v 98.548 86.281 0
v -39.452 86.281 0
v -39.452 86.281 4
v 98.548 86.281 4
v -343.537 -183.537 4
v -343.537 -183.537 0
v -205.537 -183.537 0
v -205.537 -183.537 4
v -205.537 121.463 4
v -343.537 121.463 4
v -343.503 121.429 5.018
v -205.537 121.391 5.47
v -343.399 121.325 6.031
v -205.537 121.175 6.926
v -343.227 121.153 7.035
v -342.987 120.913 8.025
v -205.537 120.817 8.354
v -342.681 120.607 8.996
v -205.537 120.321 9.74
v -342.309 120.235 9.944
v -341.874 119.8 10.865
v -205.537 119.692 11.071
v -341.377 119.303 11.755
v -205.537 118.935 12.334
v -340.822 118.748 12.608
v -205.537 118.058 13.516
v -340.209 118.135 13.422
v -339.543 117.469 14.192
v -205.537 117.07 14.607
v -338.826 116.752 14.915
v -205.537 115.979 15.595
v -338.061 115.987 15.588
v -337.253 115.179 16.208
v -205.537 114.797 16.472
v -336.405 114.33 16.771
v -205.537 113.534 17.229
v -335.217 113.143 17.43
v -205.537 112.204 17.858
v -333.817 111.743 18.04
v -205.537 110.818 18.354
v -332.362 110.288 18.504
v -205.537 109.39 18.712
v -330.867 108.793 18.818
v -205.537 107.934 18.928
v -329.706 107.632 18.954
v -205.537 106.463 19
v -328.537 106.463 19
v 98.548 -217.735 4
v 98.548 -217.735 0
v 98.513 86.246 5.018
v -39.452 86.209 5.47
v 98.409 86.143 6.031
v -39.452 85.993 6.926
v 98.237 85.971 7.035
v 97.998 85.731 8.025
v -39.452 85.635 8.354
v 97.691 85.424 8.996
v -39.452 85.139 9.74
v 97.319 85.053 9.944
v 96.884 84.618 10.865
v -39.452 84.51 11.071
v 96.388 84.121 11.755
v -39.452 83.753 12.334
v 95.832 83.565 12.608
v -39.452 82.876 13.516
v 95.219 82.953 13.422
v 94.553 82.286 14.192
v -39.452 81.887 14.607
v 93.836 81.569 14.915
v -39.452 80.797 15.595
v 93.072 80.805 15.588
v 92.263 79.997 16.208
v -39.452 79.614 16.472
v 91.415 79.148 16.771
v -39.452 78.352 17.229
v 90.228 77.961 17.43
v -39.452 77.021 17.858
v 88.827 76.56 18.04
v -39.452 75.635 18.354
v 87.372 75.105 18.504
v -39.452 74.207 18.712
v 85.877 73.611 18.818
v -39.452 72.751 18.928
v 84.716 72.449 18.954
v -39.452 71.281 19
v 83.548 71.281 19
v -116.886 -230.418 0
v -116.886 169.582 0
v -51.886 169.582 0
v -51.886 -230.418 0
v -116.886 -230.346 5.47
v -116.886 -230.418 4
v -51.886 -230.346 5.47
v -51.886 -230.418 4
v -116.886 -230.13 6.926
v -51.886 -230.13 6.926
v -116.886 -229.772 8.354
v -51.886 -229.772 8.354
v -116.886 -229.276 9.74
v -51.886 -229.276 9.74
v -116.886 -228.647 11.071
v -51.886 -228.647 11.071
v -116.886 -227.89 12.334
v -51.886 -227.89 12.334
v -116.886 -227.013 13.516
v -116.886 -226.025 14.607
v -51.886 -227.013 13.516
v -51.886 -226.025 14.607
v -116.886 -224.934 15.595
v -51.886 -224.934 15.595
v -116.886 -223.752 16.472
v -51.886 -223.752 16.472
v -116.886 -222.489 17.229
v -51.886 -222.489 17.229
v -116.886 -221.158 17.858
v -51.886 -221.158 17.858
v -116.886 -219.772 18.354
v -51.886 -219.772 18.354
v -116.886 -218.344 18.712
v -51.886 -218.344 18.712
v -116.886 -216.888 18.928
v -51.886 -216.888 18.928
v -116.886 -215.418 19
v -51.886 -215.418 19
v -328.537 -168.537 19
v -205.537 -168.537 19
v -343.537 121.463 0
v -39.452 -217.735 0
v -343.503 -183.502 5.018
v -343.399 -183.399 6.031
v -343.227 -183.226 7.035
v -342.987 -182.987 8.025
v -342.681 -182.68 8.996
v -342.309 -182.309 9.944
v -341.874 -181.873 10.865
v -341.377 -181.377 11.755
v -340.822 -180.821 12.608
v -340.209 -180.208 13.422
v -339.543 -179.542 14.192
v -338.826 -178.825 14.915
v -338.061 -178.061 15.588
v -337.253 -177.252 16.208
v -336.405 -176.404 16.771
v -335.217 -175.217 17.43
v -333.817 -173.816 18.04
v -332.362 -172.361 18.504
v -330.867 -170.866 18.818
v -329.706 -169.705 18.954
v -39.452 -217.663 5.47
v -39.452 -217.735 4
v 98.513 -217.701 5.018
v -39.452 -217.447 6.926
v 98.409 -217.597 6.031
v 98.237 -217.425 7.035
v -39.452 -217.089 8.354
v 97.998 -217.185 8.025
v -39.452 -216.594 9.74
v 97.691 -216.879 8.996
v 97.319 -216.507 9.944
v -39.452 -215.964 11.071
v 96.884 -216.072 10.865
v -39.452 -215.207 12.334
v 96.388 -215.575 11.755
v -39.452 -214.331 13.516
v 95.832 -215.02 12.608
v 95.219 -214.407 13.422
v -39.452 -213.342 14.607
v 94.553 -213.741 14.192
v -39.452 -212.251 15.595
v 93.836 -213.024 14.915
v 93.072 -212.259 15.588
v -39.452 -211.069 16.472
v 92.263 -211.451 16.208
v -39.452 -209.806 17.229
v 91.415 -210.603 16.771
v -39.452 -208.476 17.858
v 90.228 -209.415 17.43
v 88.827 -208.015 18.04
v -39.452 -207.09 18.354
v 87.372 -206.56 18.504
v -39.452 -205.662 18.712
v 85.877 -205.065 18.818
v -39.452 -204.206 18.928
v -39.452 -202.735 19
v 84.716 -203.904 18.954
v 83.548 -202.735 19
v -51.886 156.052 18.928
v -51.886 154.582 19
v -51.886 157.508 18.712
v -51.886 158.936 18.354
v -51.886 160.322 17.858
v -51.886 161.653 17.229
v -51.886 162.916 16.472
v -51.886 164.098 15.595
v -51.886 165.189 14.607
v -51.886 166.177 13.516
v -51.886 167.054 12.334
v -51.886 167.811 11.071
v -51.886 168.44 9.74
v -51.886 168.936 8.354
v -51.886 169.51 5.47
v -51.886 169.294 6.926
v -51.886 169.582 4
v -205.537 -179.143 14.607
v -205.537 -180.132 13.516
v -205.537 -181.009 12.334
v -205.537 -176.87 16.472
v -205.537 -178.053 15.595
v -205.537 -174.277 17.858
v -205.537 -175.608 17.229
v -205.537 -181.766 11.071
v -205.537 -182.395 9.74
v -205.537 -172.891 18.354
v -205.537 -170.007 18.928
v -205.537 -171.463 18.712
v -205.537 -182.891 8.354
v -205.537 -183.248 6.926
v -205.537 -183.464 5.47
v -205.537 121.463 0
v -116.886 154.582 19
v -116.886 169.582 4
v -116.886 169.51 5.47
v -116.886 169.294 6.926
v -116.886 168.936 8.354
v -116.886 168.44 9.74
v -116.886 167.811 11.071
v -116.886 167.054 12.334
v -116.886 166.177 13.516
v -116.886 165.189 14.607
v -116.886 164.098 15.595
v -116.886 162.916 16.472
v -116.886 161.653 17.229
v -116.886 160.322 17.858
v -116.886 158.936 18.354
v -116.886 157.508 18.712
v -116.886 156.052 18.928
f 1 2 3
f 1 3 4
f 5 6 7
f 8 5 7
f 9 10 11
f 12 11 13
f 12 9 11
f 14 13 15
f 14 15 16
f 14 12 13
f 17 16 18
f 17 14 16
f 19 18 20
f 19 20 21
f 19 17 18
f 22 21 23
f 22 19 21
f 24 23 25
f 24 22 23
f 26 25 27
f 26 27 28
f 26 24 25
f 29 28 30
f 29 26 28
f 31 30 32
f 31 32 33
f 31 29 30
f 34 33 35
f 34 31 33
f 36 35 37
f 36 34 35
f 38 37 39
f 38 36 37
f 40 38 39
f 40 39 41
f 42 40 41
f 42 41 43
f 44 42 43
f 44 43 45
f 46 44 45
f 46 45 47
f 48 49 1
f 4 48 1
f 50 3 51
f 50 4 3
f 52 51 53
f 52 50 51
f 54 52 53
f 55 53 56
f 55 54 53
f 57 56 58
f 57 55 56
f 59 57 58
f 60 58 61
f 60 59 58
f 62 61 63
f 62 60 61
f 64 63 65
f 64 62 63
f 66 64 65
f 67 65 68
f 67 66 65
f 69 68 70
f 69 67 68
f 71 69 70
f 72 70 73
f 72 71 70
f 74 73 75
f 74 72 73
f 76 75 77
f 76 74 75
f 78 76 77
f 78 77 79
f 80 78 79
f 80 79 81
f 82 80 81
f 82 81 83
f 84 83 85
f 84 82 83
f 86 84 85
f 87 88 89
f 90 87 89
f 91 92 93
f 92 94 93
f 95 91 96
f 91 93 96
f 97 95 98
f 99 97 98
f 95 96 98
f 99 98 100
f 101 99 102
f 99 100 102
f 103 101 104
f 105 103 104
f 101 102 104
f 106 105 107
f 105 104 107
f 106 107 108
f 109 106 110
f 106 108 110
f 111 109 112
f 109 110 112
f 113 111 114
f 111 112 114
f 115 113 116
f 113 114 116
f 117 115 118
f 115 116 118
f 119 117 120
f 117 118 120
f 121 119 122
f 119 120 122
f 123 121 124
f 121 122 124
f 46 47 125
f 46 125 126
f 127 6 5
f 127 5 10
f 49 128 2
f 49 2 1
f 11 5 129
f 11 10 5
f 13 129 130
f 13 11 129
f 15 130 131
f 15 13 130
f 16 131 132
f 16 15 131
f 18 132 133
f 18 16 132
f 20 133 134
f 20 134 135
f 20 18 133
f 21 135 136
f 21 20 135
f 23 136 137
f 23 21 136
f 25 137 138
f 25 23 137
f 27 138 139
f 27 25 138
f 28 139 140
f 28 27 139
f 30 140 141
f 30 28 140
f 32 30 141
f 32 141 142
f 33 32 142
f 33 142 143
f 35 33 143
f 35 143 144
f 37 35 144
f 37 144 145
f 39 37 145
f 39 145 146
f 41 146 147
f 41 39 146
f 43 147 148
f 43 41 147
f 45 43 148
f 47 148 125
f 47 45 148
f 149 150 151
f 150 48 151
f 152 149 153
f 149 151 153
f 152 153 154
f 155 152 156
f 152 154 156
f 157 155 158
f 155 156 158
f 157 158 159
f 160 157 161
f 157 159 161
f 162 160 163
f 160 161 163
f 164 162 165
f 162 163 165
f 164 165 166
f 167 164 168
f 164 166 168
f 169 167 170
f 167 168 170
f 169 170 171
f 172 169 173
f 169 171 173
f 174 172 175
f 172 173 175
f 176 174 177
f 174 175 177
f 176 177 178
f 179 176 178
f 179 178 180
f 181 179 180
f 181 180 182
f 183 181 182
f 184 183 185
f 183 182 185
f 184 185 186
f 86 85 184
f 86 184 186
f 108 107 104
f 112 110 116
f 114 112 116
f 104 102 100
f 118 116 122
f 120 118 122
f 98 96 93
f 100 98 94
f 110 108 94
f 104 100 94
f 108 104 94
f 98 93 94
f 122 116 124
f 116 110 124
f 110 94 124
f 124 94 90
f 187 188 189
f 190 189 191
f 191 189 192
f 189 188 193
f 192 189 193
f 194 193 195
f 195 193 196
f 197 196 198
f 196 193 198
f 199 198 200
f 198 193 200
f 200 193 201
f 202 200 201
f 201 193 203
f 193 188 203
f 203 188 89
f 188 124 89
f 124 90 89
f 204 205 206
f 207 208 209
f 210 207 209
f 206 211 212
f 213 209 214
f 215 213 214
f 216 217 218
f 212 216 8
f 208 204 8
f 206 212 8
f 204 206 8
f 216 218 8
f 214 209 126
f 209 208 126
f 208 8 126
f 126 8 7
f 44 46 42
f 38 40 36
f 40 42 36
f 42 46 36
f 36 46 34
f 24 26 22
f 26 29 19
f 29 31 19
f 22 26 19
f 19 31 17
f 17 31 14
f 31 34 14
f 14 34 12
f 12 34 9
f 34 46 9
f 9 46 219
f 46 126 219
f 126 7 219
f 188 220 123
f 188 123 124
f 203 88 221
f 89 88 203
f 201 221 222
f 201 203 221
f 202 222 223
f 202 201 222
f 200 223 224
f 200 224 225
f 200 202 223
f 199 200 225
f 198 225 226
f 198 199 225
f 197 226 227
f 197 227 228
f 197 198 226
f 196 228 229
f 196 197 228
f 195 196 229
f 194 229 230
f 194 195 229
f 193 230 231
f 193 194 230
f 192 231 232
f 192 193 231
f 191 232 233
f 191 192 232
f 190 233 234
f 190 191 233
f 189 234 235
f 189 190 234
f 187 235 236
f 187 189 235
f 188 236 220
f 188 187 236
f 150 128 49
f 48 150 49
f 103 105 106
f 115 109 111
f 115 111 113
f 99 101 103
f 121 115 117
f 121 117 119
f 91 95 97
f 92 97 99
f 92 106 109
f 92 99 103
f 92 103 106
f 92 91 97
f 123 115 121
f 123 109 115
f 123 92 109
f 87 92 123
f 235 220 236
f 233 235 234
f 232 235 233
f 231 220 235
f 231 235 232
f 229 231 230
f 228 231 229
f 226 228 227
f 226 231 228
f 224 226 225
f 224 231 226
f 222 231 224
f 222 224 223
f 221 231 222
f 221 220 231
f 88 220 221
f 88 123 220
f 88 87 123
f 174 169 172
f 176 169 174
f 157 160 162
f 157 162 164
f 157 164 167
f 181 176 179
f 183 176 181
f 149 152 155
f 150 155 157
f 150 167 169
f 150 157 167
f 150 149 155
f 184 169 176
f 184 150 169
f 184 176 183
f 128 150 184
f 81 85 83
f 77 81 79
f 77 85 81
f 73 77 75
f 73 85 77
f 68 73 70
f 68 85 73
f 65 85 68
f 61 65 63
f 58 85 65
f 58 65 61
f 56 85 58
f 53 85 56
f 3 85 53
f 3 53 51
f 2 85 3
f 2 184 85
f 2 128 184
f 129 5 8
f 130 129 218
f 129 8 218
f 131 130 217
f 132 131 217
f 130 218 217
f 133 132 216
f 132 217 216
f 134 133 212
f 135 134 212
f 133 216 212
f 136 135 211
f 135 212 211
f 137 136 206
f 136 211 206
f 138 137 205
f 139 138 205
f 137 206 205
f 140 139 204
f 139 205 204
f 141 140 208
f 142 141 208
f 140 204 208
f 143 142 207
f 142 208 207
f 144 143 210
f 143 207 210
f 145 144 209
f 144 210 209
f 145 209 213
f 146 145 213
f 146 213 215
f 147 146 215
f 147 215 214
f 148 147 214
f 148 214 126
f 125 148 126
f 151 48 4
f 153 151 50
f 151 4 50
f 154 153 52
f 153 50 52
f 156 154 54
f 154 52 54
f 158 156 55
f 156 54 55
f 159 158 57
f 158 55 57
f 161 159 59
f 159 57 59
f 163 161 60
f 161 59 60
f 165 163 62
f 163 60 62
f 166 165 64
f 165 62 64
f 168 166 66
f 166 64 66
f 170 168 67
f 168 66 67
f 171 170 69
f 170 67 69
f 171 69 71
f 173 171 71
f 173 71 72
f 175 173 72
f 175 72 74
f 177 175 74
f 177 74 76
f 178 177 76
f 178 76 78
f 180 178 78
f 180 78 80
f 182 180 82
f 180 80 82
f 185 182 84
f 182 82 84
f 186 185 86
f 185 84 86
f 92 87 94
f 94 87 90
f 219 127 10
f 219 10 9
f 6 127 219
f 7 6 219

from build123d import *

# Parameters (mm, degrees)
F0_W     = 65
F0_H     = 400
F1_DEPTH = 19
F2_W     = 138
F2_H     = 304.016247
F3_DEPTH = 19
F4_W     = 138
F4_H     = 305
F5_DEPTH = 19
F6_R     = 15
F6_2_R   = 15
F6_3_R   = 15


with BuildPart() as f1:
    # F0 (on Top) → F1 (new body)
    with BuildSketch(Plane.XY):
        with Locations((-84.385906, -30.418005)):
            Rectangle(F0_W, F0_H)
    extrude(amount=F1_DEPTH)

    # F6
    f6_edges = [f1.edges().sort_by_distance(p)[0] for p in [
        (-84.385906, -230.418005, 19),
        (-84.385906, 169.581995, 19),
    ]]
    fillet(f6_edges, radius=F6_R)


with BuildPart() as f3:
    # F2 (on Top) → F3 (new body)
    with BuildSketch(Plane.XY):
        with Locations((29.547637, -65.727256)):
            Rectangle(F2_W, F2_H)
    extrude(amount=F3_DEPTH)

    # F6#3
    f6_3_edges = [f3.edges().sort_by_distance(p)[0] for p in [
        (29.547637, 86.280867, 19),
        (98.547637, -65.727256, 19),
        (29.547637, -217.73538, 19),
    ]]
    fillet(f6_3_edges, radius=F6_3_R)


with BuildPart() as f5:
    # F4 (on Top) → F5 (new body)
    with BuildSketch(Plane.XY):
        with Locations((-274.53736, -31.036693)):
            Rectangle(F4_W, F4_H)
    extrude(amount=F5_DEPTH)

    # F6#2
    f6_2_edges = [f5.edges().sort_by_distance(p)[0] for p in [
        (-274.53736, -183.536693, 19),
        (-343.53736, -31.036693, 19),
        (-274.53736, 121.463307, 19),
    ]]
    fillet(f6_2_edges, radius=F6_2_R)


solid = Compound([f1.part, f3.part, f5.part])
